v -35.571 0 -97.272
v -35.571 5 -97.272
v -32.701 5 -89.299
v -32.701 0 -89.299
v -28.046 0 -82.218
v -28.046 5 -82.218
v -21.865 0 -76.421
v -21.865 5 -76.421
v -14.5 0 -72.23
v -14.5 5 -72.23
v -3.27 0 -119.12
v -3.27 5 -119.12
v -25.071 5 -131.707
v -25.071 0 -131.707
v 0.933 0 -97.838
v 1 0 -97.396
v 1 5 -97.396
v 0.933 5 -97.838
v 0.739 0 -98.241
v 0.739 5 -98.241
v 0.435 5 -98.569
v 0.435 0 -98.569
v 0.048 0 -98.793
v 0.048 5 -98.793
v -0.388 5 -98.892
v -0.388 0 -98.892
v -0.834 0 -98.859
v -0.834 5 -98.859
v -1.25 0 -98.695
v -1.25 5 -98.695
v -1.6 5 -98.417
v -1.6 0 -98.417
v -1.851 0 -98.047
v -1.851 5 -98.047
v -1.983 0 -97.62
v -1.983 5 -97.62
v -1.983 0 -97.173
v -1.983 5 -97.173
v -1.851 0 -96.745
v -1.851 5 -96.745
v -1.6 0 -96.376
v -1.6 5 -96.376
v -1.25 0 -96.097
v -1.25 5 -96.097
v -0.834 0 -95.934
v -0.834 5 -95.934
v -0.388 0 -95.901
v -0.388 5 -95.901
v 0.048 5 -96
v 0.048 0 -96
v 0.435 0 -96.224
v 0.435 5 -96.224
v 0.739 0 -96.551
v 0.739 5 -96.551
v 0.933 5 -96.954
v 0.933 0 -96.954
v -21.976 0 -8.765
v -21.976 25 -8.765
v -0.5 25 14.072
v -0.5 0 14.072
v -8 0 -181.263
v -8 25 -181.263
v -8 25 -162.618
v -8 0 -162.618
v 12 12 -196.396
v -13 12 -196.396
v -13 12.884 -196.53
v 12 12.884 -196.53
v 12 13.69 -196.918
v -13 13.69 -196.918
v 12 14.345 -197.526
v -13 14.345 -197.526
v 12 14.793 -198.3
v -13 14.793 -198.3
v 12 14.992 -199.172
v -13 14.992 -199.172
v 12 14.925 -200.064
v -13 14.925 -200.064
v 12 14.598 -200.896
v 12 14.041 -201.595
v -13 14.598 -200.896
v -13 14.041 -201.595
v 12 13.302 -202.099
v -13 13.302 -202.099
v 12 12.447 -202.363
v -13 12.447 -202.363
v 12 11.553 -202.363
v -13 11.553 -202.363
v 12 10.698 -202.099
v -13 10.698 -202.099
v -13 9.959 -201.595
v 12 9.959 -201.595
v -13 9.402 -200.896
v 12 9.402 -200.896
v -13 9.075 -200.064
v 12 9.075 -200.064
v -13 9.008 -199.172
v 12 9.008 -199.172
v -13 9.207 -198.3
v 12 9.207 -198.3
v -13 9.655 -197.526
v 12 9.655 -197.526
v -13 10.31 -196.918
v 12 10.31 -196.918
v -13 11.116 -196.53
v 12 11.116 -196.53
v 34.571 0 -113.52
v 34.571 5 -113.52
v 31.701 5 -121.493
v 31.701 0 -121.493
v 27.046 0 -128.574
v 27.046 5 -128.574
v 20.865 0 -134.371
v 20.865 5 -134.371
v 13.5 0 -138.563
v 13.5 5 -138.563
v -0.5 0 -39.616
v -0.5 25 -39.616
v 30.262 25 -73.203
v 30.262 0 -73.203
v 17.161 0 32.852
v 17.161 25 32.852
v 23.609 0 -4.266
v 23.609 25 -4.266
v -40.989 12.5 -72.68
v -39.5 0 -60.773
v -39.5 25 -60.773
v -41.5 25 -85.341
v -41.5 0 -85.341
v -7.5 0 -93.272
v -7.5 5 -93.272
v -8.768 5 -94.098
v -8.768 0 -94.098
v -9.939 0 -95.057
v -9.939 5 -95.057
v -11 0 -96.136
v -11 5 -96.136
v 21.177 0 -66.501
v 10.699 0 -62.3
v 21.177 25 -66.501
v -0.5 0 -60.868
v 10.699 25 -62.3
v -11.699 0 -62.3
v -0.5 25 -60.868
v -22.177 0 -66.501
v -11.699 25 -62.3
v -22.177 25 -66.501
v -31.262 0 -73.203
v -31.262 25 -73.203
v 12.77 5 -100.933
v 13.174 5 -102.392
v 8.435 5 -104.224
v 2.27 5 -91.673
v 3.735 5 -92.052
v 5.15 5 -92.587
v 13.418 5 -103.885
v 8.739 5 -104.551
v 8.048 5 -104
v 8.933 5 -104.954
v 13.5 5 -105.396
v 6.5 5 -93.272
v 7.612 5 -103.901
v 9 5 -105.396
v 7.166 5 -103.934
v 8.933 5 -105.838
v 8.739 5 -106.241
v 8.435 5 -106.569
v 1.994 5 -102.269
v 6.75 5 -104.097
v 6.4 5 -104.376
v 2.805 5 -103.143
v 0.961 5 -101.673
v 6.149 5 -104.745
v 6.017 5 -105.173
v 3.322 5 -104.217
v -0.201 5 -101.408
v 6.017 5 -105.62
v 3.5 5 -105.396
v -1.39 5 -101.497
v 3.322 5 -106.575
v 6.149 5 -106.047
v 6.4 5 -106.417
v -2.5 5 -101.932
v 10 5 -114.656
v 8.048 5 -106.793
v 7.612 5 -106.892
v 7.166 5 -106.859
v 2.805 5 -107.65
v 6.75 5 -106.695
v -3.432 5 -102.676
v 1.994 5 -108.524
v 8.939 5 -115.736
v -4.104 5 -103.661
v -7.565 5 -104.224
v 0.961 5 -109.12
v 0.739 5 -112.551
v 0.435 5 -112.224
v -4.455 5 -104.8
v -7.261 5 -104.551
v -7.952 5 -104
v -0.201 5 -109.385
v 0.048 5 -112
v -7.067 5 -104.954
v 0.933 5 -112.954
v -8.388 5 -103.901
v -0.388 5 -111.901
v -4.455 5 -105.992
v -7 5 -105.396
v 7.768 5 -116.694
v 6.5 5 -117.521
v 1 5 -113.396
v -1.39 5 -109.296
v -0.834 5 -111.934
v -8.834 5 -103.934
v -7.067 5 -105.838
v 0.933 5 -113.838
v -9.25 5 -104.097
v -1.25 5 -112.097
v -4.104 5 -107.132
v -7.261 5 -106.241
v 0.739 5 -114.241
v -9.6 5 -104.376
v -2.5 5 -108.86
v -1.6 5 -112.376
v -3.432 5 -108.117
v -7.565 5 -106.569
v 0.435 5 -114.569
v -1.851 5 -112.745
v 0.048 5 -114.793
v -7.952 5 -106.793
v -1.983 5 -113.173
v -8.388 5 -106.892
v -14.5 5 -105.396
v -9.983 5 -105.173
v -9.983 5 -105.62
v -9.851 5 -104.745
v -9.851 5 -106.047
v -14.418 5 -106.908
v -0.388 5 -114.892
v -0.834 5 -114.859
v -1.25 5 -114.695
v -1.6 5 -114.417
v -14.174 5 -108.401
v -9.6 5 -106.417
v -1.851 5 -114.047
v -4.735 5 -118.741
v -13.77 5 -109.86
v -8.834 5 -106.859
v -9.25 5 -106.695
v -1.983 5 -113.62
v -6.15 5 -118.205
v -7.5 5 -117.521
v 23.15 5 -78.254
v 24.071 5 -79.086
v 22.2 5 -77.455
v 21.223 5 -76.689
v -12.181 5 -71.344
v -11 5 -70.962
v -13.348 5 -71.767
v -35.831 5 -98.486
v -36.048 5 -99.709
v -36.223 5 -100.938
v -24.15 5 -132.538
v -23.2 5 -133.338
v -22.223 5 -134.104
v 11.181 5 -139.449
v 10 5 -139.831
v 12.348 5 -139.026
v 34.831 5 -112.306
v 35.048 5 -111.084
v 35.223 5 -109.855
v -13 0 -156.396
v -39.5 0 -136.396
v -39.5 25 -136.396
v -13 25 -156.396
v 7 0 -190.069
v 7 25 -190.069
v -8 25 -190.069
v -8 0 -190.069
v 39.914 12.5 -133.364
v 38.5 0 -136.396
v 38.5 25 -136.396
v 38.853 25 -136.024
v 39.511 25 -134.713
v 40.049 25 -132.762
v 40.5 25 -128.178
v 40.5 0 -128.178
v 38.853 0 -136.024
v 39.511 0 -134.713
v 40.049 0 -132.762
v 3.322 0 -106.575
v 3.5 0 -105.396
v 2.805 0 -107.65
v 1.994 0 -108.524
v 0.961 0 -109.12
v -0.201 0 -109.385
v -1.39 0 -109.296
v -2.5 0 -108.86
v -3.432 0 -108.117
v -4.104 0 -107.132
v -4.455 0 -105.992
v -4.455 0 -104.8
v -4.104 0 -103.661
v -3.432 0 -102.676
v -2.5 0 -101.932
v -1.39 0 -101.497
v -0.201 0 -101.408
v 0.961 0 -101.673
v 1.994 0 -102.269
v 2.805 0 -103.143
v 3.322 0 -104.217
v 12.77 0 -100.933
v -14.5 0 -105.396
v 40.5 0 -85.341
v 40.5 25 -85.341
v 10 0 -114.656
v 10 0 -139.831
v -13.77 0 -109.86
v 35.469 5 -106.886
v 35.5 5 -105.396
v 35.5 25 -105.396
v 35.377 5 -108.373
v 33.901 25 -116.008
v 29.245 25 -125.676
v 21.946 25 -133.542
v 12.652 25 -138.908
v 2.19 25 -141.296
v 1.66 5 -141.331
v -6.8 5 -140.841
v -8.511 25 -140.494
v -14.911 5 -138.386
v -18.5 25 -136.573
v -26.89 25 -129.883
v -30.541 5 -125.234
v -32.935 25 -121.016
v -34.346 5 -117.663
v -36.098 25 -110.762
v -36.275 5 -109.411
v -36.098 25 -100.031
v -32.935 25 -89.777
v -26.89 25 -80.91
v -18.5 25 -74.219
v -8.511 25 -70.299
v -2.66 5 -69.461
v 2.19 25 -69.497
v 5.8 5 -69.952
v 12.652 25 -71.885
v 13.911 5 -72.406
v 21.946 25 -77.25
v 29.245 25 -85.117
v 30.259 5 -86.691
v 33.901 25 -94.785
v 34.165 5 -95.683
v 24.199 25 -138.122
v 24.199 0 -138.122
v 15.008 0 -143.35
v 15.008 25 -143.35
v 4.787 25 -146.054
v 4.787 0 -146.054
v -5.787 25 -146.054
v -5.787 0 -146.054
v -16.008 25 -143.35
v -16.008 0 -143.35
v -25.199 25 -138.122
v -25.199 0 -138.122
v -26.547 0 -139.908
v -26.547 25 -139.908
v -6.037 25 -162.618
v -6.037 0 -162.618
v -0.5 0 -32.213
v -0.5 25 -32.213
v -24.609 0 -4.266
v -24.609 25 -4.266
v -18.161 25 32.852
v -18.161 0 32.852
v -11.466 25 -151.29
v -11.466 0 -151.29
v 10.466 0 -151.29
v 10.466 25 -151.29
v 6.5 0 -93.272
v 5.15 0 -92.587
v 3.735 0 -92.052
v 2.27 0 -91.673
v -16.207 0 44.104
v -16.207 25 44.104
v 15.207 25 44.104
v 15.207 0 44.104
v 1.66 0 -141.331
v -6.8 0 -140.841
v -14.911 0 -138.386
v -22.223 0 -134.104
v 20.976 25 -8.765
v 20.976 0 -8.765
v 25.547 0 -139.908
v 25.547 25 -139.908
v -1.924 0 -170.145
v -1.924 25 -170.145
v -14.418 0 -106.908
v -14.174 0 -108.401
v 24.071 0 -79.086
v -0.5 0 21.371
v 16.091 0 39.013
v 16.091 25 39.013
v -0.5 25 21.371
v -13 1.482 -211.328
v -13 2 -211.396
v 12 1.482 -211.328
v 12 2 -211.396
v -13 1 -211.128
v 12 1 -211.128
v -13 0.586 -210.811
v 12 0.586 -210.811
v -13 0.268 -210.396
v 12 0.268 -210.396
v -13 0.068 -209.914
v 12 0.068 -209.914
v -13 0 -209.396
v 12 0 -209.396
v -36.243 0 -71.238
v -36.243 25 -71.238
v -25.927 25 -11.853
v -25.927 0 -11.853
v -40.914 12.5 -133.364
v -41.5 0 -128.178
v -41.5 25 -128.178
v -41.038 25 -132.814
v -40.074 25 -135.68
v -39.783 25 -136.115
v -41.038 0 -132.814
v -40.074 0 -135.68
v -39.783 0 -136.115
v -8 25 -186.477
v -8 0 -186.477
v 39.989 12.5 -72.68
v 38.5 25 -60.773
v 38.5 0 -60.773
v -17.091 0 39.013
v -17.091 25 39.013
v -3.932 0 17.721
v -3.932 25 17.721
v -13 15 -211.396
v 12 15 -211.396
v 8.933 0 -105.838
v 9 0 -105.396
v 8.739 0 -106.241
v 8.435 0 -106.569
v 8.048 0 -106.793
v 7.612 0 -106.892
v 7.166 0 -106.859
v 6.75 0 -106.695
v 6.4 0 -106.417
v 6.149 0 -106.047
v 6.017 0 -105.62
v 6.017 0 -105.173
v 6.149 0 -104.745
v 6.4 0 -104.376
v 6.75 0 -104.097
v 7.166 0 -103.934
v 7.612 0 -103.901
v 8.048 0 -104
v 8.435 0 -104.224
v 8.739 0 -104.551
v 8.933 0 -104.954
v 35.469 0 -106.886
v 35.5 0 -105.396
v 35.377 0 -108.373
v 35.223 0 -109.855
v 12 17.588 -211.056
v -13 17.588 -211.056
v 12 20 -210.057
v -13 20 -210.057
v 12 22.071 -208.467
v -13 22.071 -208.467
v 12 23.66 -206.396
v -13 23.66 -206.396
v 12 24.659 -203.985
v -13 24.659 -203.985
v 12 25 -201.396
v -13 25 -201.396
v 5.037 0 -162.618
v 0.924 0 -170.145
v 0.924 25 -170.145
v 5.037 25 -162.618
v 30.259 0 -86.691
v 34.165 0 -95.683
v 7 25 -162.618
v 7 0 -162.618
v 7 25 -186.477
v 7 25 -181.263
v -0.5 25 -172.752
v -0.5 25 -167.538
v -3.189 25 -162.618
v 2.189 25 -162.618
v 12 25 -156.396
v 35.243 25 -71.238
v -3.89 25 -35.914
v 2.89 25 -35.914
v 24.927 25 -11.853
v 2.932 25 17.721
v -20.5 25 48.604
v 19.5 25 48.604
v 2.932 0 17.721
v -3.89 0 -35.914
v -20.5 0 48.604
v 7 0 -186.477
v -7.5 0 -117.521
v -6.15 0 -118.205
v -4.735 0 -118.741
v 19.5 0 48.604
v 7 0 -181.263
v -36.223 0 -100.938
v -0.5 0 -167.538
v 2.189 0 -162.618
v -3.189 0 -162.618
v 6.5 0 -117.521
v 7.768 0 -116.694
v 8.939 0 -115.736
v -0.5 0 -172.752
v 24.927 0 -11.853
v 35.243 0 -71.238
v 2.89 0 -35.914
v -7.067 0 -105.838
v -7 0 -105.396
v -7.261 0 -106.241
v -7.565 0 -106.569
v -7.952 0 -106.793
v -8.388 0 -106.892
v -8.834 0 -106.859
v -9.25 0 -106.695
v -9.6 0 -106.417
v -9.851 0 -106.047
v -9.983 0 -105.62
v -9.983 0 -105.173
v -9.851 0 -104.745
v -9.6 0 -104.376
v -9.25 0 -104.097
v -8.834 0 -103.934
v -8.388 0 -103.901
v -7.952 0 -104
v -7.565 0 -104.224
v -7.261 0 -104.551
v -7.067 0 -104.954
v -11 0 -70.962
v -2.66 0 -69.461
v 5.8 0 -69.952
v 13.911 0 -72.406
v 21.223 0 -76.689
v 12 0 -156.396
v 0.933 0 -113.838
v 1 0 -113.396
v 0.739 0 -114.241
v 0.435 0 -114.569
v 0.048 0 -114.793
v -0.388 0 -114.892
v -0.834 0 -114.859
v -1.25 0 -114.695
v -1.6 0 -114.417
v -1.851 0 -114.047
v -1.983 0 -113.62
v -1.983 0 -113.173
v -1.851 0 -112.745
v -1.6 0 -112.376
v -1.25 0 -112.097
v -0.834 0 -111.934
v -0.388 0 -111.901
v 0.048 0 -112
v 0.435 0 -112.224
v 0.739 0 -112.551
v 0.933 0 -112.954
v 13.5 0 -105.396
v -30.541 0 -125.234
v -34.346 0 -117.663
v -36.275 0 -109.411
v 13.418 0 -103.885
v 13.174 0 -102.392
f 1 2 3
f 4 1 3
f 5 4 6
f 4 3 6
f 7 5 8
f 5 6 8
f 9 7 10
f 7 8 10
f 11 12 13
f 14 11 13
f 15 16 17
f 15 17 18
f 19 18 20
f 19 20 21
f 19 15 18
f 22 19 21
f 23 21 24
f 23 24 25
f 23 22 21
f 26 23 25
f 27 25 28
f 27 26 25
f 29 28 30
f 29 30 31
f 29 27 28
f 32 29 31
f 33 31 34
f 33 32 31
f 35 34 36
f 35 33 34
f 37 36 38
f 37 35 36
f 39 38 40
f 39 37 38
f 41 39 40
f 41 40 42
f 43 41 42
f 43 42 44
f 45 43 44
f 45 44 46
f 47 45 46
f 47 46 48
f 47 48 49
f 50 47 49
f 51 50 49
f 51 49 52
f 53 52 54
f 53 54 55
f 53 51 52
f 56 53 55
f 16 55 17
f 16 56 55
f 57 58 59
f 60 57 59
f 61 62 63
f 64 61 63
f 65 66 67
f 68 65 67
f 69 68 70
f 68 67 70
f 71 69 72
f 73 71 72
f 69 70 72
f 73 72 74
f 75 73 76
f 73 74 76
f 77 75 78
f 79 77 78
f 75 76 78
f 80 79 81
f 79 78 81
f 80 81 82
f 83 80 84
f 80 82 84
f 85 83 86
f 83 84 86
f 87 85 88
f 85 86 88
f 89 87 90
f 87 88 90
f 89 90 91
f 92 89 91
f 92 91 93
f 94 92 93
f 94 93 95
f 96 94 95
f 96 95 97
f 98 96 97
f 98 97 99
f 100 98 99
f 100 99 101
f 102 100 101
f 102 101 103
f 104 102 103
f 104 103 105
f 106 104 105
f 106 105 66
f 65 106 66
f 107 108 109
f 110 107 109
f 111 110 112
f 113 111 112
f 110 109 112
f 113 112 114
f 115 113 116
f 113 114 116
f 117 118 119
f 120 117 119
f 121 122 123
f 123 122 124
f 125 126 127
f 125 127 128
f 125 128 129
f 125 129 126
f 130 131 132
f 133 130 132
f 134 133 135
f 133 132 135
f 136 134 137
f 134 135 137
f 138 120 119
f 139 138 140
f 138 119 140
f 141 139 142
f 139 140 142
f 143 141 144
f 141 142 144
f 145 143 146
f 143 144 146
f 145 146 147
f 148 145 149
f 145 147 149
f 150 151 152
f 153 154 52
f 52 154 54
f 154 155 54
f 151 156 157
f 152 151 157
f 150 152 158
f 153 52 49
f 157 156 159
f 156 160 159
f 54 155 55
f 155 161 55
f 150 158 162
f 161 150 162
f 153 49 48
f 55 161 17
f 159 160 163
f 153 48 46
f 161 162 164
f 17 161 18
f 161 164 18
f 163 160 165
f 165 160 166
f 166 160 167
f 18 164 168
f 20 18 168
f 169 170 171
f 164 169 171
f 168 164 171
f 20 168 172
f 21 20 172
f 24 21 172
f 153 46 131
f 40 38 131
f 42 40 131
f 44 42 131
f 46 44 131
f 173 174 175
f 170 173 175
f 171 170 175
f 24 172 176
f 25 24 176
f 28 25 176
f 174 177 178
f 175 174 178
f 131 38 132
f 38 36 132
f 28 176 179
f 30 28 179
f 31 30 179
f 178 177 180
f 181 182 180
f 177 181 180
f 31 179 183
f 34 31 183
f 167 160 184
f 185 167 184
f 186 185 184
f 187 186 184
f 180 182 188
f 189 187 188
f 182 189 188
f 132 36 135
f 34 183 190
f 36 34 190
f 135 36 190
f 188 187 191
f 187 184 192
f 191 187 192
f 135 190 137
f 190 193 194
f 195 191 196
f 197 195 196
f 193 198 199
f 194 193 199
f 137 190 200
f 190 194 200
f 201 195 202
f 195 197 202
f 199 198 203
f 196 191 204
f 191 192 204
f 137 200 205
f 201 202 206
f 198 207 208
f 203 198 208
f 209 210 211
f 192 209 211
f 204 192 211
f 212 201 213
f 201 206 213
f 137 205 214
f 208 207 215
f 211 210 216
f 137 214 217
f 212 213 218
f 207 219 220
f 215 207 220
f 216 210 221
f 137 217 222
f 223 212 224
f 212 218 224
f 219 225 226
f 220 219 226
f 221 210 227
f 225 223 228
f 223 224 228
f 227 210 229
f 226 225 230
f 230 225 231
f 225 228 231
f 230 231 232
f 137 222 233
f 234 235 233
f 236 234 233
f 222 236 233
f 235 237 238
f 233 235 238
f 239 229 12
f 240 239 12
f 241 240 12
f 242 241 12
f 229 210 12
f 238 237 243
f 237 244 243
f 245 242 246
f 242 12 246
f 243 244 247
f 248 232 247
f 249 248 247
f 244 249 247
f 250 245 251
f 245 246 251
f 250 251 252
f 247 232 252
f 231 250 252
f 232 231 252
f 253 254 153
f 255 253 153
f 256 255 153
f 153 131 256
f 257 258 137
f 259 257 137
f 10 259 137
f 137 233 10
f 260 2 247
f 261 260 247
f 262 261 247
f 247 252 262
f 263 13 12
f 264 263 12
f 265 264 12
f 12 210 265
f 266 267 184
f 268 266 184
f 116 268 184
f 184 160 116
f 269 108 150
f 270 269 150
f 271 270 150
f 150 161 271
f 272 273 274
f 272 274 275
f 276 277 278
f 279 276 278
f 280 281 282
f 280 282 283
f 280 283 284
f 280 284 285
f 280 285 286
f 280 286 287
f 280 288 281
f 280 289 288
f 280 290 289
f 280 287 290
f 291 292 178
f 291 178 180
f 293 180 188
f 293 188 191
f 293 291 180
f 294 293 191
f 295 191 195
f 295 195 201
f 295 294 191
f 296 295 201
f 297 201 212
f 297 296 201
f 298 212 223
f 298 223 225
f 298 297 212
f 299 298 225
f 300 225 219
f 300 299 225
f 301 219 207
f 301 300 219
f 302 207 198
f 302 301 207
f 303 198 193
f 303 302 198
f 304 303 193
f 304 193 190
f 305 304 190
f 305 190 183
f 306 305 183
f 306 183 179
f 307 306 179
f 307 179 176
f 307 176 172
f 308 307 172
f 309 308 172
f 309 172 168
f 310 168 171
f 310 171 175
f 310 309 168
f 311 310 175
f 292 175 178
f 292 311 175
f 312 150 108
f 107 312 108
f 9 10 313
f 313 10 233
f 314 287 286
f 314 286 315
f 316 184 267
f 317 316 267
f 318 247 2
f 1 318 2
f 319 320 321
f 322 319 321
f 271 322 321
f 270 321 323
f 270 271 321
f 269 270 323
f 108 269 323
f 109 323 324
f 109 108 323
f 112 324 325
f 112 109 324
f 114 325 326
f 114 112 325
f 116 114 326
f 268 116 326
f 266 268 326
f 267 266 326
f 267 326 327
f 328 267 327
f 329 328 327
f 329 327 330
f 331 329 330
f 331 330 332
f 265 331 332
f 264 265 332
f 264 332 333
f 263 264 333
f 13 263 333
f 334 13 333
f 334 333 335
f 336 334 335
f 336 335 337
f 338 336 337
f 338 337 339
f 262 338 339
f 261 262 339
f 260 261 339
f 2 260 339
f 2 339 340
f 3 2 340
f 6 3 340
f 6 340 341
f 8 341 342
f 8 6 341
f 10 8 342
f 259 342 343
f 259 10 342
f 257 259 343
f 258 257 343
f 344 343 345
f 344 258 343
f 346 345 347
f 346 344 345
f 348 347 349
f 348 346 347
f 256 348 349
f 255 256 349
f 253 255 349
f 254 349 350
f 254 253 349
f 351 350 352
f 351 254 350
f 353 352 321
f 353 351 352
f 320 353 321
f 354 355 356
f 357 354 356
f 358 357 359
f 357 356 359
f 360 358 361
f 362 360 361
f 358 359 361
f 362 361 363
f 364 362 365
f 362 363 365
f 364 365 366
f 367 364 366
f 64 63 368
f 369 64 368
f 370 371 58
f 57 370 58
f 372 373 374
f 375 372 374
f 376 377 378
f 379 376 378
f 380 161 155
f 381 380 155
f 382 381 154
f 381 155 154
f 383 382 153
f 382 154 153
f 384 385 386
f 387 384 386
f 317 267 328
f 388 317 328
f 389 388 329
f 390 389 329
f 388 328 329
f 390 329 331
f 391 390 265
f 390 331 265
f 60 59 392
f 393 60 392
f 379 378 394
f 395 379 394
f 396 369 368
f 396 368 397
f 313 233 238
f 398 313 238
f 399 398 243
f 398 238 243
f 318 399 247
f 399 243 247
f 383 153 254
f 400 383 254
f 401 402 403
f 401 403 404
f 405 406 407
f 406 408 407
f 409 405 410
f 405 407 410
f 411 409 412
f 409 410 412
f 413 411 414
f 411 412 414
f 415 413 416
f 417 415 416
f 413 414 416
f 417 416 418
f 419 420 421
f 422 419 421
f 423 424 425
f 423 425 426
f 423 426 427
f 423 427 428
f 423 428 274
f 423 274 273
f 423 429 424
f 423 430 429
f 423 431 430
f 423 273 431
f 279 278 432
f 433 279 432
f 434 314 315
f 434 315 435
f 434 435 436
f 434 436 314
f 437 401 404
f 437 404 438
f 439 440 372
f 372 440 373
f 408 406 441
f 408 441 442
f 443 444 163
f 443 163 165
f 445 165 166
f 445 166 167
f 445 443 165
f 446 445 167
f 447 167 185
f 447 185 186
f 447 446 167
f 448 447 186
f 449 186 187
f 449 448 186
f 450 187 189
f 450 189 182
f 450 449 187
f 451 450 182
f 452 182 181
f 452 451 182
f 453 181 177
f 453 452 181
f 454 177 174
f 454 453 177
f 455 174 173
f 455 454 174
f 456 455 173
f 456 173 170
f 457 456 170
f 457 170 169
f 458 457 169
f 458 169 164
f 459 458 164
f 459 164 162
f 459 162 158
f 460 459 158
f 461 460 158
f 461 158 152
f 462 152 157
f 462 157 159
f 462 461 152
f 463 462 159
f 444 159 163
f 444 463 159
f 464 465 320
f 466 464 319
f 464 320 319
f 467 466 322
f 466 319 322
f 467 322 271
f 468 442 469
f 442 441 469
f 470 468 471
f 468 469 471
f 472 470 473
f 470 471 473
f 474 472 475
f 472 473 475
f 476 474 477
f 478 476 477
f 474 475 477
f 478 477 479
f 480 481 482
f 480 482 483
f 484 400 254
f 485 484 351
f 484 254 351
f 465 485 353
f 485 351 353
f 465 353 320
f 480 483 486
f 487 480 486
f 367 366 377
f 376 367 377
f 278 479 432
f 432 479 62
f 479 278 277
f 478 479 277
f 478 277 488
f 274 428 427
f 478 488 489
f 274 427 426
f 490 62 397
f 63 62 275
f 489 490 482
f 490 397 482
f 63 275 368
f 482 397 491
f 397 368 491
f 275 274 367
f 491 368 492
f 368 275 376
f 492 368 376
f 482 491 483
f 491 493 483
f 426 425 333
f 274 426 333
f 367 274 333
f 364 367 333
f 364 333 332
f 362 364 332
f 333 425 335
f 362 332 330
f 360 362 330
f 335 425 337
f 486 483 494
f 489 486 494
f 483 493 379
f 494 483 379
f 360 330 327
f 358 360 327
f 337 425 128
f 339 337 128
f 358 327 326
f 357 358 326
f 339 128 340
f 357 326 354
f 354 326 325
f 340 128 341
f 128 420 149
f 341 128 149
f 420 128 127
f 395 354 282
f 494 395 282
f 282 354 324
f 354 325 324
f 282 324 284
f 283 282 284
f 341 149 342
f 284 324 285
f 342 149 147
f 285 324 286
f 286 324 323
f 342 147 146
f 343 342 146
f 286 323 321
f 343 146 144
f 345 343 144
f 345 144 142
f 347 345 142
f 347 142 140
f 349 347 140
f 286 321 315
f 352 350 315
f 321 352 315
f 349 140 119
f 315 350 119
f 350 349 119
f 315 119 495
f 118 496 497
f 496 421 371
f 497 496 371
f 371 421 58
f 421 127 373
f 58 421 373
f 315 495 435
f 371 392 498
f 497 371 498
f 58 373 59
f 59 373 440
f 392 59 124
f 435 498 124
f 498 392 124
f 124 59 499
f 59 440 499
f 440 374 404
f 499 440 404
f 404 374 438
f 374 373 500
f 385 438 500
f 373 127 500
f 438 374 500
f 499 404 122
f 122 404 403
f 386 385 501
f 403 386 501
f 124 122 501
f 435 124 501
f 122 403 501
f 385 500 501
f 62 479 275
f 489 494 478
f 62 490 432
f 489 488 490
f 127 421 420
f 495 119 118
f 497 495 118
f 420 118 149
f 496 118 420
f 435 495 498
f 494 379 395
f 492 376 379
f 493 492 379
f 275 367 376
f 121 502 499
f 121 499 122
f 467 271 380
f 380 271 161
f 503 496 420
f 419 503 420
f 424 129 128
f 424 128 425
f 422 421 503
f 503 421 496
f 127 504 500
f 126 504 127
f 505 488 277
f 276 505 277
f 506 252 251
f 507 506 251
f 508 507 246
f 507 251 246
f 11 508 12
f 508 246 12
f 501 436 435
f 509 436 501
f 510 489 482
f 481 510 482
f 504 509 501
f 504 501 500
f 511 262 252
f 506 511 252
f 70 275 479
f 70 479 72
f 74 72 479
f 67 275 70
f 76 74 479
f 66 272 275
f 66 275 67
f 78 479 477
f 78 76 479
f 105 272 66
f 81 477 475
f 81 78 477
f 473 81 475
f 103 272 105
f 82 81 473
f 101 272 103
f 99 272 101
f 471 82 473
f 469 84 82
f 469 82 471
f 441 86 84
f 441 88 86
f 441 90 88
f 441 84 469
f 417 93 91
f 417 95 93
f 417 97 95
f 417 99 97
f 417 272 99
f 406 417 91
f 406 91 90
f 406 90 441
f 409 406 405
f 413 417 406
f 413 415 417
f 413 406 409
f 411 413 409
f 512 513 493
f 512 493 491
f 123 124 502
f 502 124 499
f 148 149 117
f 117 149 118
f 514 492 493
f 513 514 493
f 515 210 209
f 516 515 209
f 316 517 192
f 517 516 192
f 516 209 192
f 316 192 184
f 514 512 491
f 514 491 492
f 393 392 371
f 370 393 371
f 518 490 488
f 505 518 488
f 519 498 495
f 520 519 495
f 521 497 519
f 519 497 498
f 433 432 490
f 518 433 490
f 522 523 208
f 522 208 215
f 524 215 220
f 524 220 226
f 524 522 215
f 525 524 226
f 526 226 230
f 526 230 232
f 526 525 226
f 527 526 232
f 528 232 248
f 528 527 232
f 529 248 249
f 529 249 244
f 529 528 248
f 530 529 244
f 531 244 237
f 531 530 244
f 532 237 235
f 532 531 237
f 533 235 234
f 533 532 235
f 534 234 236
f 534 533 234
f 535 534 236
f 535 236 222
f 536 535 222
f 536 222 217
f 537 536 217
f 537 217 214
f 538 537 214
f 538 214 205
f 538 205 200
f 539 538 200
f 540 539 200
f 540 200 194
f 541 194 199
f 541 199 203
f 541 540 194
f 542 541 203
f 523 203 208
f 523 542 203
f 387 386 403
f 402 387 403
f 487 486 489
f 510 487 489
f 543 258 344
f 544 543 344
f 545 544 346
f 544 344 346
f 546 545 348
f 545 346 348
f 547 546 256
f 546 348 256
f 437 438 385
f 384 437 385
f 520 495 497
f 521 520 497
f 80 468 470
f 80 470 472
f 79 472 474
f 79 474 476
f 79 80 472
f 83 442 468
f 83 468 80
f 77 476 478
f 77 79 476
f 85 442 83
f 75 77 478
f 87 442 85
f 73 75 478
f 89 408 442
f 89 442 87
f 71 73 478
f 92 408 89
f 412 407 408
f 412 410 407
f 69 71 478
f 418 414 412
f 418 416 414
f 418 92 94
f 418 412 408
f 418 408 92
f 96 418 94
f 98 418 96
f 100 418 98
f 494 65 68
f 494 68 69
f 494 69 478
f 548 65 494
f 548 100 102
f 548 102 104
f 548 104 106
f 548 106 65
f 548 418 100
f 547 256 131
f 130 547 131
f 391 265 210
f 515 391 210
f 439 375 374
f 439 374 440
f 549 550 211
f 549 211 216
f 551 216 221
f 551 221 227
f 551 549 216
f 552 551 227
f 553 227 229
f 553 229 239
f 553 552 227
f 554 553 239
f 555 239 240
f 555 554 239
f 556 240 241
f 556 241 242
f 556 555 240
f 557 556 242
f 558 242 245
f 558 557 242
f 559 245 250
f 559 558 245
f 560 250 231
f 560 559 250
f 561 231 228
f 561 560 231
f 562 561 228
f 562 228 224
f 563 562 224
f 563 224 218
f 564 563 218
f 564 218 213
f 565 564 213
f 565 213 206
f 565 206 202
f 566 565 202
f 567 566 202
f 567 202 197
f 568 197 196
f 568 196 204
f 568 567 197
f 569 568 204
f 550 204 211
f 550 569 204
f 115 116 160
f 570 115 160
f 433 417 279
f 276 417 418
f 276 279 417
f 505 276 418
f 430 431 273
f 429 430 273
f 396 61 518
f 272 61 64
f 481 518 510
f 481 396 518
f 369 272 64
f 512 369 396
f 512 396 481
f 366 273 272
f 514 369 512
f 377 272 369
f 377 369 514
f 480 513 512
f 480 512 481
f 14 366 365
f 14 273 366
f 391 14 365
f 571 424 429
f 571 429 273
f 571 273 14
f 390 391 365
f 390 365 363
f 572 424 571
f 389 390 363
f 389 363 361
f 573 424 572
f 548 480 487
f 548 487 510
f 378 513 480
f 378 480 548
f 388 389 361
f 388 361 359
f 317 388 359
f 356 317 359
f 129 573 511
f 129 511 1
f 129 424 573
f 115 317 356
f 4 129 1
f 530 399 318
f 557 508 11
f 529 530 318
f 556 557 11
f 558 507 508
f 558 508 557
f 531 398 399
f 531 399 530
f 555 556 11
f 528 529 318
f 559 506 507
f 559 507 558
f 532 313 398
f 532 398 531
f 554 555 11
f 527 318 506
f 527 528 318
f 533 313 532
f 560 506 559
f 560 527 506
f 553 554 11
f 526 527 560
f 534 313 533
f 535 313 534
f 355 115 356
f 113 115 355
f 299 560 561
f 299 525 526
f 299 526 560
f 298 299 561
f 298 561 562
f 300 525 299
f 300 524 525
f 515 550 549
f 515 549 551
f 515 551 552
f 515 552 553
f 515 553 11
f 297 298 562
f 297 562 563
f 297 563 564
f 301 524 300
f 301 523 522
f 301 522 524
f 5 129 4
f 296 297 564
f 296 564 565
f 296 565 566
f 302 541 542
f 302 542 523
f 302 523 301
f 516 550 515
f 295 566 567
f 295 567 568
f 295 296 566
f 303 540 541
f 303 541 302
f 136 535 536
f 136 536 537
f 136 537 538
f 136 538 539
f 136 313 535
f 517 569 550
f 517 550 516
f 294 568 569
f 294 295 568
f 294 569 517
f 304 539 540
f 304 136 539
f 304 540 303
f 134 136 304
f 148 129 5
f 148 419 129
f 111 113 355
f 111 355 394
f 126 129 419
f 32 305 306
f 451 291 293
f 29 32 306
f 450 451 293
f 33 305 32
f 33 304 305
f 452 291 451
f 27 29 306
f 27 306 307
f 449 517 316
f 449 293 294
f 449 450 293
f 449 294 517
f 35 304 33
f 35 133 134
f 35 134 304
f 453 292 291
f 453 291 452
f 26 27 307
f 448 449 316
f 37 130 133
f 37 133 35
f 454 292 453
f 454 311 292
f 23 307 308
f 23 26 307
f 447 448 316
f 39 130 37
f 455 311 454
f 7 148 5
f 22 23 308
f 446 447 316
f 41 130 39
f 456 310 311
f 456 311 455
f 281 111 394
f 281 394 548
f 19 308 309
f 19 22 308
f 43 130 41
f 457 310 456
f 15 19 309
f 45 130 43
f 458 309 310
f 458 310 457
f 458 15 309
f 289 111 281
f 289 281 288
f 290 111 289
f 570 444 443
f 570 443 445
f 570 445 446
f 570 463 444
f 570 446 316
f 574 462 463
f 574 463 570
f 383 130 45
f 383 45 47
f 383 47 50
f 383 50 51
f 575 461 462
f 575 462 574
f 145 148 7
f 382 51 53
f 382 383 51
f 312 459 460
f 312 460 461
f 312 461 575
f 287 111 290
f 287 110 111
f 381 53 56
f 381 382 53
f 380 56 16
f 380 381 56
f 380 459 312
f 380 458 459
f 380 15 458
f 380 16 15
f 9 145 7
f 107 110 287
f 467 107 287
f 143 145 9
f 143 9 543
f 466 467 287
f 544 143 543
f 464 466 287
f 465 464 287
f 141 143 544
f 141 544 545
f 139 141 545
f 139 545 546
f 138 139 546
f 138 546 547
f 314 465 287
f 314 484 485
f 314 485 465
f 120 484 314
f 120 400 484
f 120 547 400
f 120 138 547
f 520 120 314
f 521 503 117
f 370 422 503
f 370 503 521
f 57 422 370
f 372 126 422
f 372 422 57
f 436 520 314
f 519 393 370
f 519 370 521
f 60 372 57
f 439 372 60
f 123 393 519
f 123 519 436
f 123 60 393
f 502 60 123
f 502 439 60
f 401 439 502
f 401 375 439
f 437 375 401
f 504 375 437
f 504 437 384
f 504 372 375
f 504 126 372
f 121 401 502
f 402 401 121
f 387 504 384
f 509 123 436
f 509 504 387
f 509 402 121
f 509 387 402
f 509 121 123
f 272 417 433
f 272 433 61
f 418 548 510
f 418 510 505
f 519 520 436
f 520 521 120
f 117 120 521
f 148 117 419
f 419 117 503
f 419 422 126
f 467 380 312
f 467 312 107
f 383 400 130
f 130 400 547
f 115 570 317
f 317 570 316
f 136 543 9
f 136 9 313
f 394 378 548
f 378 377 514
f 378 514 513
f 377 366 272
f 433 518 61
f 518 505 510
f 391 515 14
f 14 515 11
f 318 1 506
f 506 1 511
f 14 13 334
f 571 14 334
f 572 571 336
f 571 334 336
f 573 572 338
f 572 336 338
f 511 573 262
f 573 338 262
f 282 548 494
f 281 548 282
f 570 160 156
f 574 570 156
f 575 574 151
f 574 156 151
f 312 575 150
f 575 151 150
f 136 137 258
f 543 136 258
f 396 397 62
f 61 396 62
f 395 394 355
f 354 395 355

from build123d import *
from build123d.topology import SkipClean

# Parameters (mm, degrees)
SZKIC1_R                    = 1.5
SZKIC1_R_2                  = 4
DODANIE_WYCI_GNI_CIE1_DEPTH = 5
SZKIC1_3_R                  = 36
DODANIE_WYCI_GNI_CIE2_DEPTH = 25
ZAOKR_GLENIE1_R             = 10
ZAOKR_GLENIE2_R             = 2
SZKIC3_R                    = 3
WYTNIJ_WYCI_GNI_CIE2_DEPTH  = 220.010630871
WYTNIJ_WYCI_GNI_CIE3_DEPTH  = 216.983000337
WYTNIJ_WYCI_GNI_CIE4_DEPTH  = 217.503248093
WYTNIJ_WYCI_GNI_CIE5_DEPTH  = 217.503248093
DODANIE_WYCI_GNI_CIE3_DEPTH = 25


with BuildPart() as part:
    # Szkic1 → Dodanie-wyci_gni_cie1 (new body)
    with BuildSketch(Plane(origin=(0, 0, 0), x_dir=(1, 0, 0), z_dir=(0, 1, 0))):
        Polygon((-39.5, 60.773175281), (-20.5, -48.6036745), (19.5, -48.6036745), (38.5, 60.773175281), (38.5, 136.3963255), (12, 156.3963255), (12, 211.3963255), (-13, 211.3963255), (-13, 156.3963255), (-39.5, 136.3963255), align=None)
        with BuildLine():
            ThreePointArc((24.198683142, 138.122080663), (-0.5, 146.3963255), (-25.198683142, 138.122080663))
            Line((-25.198683142, 138.122080663), (-26.54670895, 139.908214858))
            Line((-26.54670895, 139.908214858), (-11.466042799, 151.289849688))
            Line((-11.466042799, 151.289849688), (10.466042799, 151.289849688))
            Line((10.466042799, 151.289849688), (25.54670895, 139.908214858))
            Line((25.54670895, 139.908214858), (24.198683142, 138.122080663))
        make_face(mode=Mode.SUBTRACT)
        with Locations((7.5, 105.3963255)):
            Circle(SZKIC1_R, mode=Mode.SUBTRACT)
        with Locations((-0.5, 97.3963255)):
            Circle(SZKIC1_R, mode=Mode.SUBTRACT)
        with Locations((-8.5, 105.3963255)):
            Circle(SZKIC1_R, mode=Mode.SUBTRACT)
        with Locations((-0.5, 105.3963255)):
            Circle(SZKIC1_R_2, mode=Mode.SUBTRACT)
        with Locations((-0.5, 113.3963255)):
            Circle(SZKIC1_R, mode=Mode.SUBTRACT)
    extrude(amount=DODANIE_WYCI_GNI_CIE1_DEPTH)

    # Szkic1_3 → Dodanie-wyci_gni_cie2 (add)
    with BuildSketch(Plane(origin=(0, 0, 0), x_dir=(1, 0, 0), z_dir=(0, 1, 0))):
        Polygon((-39.5, 60.773175281), (-20.5, -48.6036745), (19.5, -48.6036745), (38.5, 60.773175281), (38.5, 136.3963255), (12, 156.3963255), (12, 211.3963255), (-13, 211.3963255), (-13, 156.3963255), (-39.5, 136.3963255), align=None)
        with Locations((-0.5, 105.3963255)):
            Circle(SZKIC1_3_R, mode=Mode.SUBTRACT)
        with BuildLine():
            ThreePointArc((24.198683142, 138.122080663), (-0.5, 146.3963255), (-25.198683142, 138.122080663))
            Line((-25.198683142, 138.122080663), (-26.54670895, 139.908214858))
            Line((-26.54670895, 139.908214858), (-11.466042799, 151.289849688))
            Line((-11.466042799, 151.289849688), (10.466042799, 151.289849688))
            Line((10.466042799, 151.289849688), (25.54670895, 139.908214858))
            Line((25.54670895, 139.908214858), (24.198683142, 138.122080663))
        make_face(mode=Mode.SUBTRACT)
    extrude(amount=DODANIE_WYCI_GNI_CIE2_DEPTH)

    # Zaokr_glenie1
    zaokr_glenie1_edges = [part.edges().sort_by_distance(p)[0] for p in [
        (-0.5, 25, -211.3963255),
    ]]
    fillet(zaokr_glenie1_edges, radius=ZAOKR_GLENIE1_R)

    # Zaokr_glenie2
    zaokr_glenie2_edges = [part.edges().sort_by_distance(p)[0] for p in [
        (-0.5, 0, -211.3963255),
    ]]
    fillet(zaokr_glenie2_edges, radius=ZAOKR_GLENIE2_R)

    # Szkic3 → Wytnij-wyci_gni_cie2 (cut, through all)
    with BuildSketch(Plane.ZY.offset(13)):
        with Locations((-199.3963255, 12)):
            Circle(SZKIC3_R)
    extrude(amount=-WYTNIJ_WYCI_GNI_CIE2_DEPTH, mode=Mode.SUBTRACT)

    # Szkic4 → Wytnij-wyci_gni_cie3 (cut, through all)
    with SkipClean():  # the faces are left unmerged after this step: merging them gives an invalid solid
        with BuildSketch(Plane(origin=(0, 5, 0), x_dir=(1, 0, 0), z_dir=(0, 1, 0))):
            with BuildLine():
                Line((13.5, 138.562573403), (13.5, 105.3963255))
                ThreePointArc((13.5, 105.3963255), (13.316169956, 103.135032123), (12.769507466, 100.933123554))
                Line((12.769507466, 100.933123554), (34.571343028, 113.520419185))
                ThreePointArc((34.571343028, 113.520419185), (27.045898944, 128.57440677), (13.5, 138.562573403))
            make_face()
            with BuildLine():
                ThreePointArc((6.5, 117.520681153), (8.366422488, 116.230832976), (10, 114.656455088))
                Line((10, 114.656455088), (10, 139.831046349))
                ThreePointArc((10, 139.831046349), (-6.799857719, 140.84081439), (-22.222813233, 134.103805104))
                Line((-22.222813233, 134.103805104), (6.5, 117.520681153))
            make_face()
            with BuildLine():
                Line((35.222813233, 109.855093798), (6.5, 93.271969847))
                ThreePointArc((6.5, 93.271969847), (4.449747468, 92.300524646), (2.269507466, 91.672993965))
                Line((2.269507466, 91.672993965), (24.071343028, 79.085698335))
                ThreePointArc((24.071343028, 79.085698335), (33.345756663, 93.129917879), (35.222813233, 109.855093798))
            make_face()
            with BuildLine():
                ThreePointArc((-7.5, 117.520681153), (-5.449747468, 118.492126353), (-3.269507466, 119.119657034))
                Line((-3.269507466, 119.119657034), (-25.071343028, 131.706952664))
                ThreePointArc((-25.071343028, 131.706952664), (-34.345756663, 117.66273312), (-36.222813233, 100.937557201))
                Line((-36.222813233, 100.937557201), (-7.5, 117.520681153))
            make_face()
            with BuildLine():
                Line((21.222813233, 76.688845895), (-7.5, 93.271969847))
                ThreePointArc((-7.5, 93.271969847), (-9.366422488, 94.561818023), (-11, 96.136195911))
                Line((-11, 96.136195911), (-11, 70.96160465))
                ThreePointArc((-11, 70.96160465), (5.799857719, 69.951836609), (21.222813233, 76.688845895))
            make_face()
            with BuildLine():
                ThreePointArc((-14.5, 105.3963255), (-14.316169956, 107.657618877), (-13.769507466, 109.859527445))
                Line((-13.769507466, 109.859527445), (-35.571343028, 97.272231814))
                ThreePointArc((-35.571343028, 97.272231814), (-28.045898944, 82.218244229), (-14.5, 72.230077596))
                Line((-14.5, 72.230077596), (-14.5, 105.3963255))
            make_face()
        extrude(amount=-WYTNIJ_WYCI_GNI_CIE3_DEPTH, mode=Mode.SUBTRACT)

    # Szkic5 → Wytnij-wyci_gni_cie4 (cut, through all)
    with SkipClean():  # the faces are left unmerged after this step: merging them gives an invalid solid
        with BuildSketch(Plane(origin=(0, 25, 0), x_dir=(1, 0, 0), z_dir=(0, 1, 0))):
            Polygon((-0.5, 167.537901521), (-3.188590085, 162.617610716), (2.188590085, 162.617610716), align=None)
            Polygon((-8, 162.617610716), (-6.037476669, 162.617610716), (-1.924443292, 170.144723317), (-8, 181.2633784), align=None)
            Polygon((0.924443292, 170.144723317), (5.037476669, 162.617610716), (7, 162.617610716), (7, 181.2633784), align=None)
            Polygon((-8, 186.477021992), (-0.5, 172.751545113), (7, 186.477021992), (7, 190.068564472), (-8, 190.068564472), align=None)
        extrude(amount=-WYTNIJ_WYCI_GNI_CIE4_DEPTH, mode=Mode.SUBTRACT)

    # Szkic6 → Wytnij-wyci_gni_cie5 (cut, through all)
    with SkipClean():  # the faces are left unmerged after this step: merging them gives an invalid solid
        with BuildSketch(Plane(origin=(0, 25, 0), x_dir=(1, 0, 0), z_dir=(0, 1, 0))):
            Polygon((2.890112786, 35.914234697), (24.927207854, 11.853436604), (35.243006097, 71.238147911), align=None)
            Polygon((2.931825406, -17.721341562), (17.161306881, -32.852341508), (23.609193637, 4.266055389), align=None)
            Polygon((-36.243006097, 71.238147911), (-25.927207854, 11.853436604), (-3.890112786, 35.914234697), align=None)
            Polygon((-24.609193637, 4.266055389), (-18.161306881, -32.852341508), (-3.931825406, -17.721341562), align=None)
            Polygon((-0.5, -21.370592599), (-17.091150305, -39.01288651), (-16.206822662, -44.1036745), (15.206822662, -44.1036745), (16.091150305, -39.01288651), align=None)
            Polygon((20.976041499, 8.764580183), (-0.5, 32.212802226), (-21.976041499, 8.764580183), (-0.5, -14.072090524), align=None)
            with BuildLine():
                Line((-31.262410293, 73.203040667), (-0.5, 39.615667168))
                Line((-0.5, 39.615667168), (30.262410293, 73.203040667))
                ThreePointArc((30.262410293, 73.203040667), (-0.5, 60.868430026), (-31.262410293, 73.203040667))
            make_face()
        extrude(amount=-WYTNIJ_WYCI_GNI_CIE5_DEPTH, mode=Mode.SUBTRACT)

    # Szkic7 → Dodanie-wyci_gni_cie3 (add)
    with SkipClean():  # the faces are left unmerged after this step: merging them gives an invalid solid
        with BuildSketch(Plane.XZ):
            with BuildLine():
                Line((40.5, -128.178388263), (40.5, -85.340764579))
                add(Edge.make_bspline(
                    [(40.5, -85.340764579), (40.5, -72.286527889), (38.5, -60.773175281)],
                    knots=[1.478281608, 1.478281608, 1.478281608, 2.061293097, 2.061293097, 2.061293097], degree=2, weights=[1, 0.957812218, 1]))
                Line((38.5, -60.773175281), (38.5, -136.3963255))
                add(Edge.make_bspline(
                    [(38.5, -136.3963255), (40.5, -134.886891537), (40.5, -128.178388263)],
                    knots=[3.382541088, 3.382541088, 3.382541088, 4.954548483, 4.954548483, 4.954548483], degree=2, weights=[1, 0.706678474, 1]))
            make_face()
            with BuildLine():
                Line((-39.5, -136.3963255), (-39.5, -60.773175281))
                add(Edge.make_bspline(
                    [(-39.5, -60.773175281), (-41.5, -72.286527889), (-41.5, -85.340764579)],
                    knots=[4.22189221, 4.22189221, 4.22189221, 4.804903699, 4.804903699, 4.804903699], degree=2, weights=[1, 0.957812218, 1]))
                Line((-41.5, -85.340764579), (-41.5, -128.178388263))
                add(Edge.make_bspline(
                    [(-41.5, -128.178388263), (-41.5, -134.886891537), (-39.5, -136.3963255)],
                    knots=[1.328636824, 1.328636824, 1.328636824, 2.900644219, 2.900644219, 2.900644219], degree=2, weights=[1, 0.706678474, 1]))
            make_face()
        extrude(amount=-DODANIE_WYCI_GNI_CIE3_DEPTH)


solid = part.part
